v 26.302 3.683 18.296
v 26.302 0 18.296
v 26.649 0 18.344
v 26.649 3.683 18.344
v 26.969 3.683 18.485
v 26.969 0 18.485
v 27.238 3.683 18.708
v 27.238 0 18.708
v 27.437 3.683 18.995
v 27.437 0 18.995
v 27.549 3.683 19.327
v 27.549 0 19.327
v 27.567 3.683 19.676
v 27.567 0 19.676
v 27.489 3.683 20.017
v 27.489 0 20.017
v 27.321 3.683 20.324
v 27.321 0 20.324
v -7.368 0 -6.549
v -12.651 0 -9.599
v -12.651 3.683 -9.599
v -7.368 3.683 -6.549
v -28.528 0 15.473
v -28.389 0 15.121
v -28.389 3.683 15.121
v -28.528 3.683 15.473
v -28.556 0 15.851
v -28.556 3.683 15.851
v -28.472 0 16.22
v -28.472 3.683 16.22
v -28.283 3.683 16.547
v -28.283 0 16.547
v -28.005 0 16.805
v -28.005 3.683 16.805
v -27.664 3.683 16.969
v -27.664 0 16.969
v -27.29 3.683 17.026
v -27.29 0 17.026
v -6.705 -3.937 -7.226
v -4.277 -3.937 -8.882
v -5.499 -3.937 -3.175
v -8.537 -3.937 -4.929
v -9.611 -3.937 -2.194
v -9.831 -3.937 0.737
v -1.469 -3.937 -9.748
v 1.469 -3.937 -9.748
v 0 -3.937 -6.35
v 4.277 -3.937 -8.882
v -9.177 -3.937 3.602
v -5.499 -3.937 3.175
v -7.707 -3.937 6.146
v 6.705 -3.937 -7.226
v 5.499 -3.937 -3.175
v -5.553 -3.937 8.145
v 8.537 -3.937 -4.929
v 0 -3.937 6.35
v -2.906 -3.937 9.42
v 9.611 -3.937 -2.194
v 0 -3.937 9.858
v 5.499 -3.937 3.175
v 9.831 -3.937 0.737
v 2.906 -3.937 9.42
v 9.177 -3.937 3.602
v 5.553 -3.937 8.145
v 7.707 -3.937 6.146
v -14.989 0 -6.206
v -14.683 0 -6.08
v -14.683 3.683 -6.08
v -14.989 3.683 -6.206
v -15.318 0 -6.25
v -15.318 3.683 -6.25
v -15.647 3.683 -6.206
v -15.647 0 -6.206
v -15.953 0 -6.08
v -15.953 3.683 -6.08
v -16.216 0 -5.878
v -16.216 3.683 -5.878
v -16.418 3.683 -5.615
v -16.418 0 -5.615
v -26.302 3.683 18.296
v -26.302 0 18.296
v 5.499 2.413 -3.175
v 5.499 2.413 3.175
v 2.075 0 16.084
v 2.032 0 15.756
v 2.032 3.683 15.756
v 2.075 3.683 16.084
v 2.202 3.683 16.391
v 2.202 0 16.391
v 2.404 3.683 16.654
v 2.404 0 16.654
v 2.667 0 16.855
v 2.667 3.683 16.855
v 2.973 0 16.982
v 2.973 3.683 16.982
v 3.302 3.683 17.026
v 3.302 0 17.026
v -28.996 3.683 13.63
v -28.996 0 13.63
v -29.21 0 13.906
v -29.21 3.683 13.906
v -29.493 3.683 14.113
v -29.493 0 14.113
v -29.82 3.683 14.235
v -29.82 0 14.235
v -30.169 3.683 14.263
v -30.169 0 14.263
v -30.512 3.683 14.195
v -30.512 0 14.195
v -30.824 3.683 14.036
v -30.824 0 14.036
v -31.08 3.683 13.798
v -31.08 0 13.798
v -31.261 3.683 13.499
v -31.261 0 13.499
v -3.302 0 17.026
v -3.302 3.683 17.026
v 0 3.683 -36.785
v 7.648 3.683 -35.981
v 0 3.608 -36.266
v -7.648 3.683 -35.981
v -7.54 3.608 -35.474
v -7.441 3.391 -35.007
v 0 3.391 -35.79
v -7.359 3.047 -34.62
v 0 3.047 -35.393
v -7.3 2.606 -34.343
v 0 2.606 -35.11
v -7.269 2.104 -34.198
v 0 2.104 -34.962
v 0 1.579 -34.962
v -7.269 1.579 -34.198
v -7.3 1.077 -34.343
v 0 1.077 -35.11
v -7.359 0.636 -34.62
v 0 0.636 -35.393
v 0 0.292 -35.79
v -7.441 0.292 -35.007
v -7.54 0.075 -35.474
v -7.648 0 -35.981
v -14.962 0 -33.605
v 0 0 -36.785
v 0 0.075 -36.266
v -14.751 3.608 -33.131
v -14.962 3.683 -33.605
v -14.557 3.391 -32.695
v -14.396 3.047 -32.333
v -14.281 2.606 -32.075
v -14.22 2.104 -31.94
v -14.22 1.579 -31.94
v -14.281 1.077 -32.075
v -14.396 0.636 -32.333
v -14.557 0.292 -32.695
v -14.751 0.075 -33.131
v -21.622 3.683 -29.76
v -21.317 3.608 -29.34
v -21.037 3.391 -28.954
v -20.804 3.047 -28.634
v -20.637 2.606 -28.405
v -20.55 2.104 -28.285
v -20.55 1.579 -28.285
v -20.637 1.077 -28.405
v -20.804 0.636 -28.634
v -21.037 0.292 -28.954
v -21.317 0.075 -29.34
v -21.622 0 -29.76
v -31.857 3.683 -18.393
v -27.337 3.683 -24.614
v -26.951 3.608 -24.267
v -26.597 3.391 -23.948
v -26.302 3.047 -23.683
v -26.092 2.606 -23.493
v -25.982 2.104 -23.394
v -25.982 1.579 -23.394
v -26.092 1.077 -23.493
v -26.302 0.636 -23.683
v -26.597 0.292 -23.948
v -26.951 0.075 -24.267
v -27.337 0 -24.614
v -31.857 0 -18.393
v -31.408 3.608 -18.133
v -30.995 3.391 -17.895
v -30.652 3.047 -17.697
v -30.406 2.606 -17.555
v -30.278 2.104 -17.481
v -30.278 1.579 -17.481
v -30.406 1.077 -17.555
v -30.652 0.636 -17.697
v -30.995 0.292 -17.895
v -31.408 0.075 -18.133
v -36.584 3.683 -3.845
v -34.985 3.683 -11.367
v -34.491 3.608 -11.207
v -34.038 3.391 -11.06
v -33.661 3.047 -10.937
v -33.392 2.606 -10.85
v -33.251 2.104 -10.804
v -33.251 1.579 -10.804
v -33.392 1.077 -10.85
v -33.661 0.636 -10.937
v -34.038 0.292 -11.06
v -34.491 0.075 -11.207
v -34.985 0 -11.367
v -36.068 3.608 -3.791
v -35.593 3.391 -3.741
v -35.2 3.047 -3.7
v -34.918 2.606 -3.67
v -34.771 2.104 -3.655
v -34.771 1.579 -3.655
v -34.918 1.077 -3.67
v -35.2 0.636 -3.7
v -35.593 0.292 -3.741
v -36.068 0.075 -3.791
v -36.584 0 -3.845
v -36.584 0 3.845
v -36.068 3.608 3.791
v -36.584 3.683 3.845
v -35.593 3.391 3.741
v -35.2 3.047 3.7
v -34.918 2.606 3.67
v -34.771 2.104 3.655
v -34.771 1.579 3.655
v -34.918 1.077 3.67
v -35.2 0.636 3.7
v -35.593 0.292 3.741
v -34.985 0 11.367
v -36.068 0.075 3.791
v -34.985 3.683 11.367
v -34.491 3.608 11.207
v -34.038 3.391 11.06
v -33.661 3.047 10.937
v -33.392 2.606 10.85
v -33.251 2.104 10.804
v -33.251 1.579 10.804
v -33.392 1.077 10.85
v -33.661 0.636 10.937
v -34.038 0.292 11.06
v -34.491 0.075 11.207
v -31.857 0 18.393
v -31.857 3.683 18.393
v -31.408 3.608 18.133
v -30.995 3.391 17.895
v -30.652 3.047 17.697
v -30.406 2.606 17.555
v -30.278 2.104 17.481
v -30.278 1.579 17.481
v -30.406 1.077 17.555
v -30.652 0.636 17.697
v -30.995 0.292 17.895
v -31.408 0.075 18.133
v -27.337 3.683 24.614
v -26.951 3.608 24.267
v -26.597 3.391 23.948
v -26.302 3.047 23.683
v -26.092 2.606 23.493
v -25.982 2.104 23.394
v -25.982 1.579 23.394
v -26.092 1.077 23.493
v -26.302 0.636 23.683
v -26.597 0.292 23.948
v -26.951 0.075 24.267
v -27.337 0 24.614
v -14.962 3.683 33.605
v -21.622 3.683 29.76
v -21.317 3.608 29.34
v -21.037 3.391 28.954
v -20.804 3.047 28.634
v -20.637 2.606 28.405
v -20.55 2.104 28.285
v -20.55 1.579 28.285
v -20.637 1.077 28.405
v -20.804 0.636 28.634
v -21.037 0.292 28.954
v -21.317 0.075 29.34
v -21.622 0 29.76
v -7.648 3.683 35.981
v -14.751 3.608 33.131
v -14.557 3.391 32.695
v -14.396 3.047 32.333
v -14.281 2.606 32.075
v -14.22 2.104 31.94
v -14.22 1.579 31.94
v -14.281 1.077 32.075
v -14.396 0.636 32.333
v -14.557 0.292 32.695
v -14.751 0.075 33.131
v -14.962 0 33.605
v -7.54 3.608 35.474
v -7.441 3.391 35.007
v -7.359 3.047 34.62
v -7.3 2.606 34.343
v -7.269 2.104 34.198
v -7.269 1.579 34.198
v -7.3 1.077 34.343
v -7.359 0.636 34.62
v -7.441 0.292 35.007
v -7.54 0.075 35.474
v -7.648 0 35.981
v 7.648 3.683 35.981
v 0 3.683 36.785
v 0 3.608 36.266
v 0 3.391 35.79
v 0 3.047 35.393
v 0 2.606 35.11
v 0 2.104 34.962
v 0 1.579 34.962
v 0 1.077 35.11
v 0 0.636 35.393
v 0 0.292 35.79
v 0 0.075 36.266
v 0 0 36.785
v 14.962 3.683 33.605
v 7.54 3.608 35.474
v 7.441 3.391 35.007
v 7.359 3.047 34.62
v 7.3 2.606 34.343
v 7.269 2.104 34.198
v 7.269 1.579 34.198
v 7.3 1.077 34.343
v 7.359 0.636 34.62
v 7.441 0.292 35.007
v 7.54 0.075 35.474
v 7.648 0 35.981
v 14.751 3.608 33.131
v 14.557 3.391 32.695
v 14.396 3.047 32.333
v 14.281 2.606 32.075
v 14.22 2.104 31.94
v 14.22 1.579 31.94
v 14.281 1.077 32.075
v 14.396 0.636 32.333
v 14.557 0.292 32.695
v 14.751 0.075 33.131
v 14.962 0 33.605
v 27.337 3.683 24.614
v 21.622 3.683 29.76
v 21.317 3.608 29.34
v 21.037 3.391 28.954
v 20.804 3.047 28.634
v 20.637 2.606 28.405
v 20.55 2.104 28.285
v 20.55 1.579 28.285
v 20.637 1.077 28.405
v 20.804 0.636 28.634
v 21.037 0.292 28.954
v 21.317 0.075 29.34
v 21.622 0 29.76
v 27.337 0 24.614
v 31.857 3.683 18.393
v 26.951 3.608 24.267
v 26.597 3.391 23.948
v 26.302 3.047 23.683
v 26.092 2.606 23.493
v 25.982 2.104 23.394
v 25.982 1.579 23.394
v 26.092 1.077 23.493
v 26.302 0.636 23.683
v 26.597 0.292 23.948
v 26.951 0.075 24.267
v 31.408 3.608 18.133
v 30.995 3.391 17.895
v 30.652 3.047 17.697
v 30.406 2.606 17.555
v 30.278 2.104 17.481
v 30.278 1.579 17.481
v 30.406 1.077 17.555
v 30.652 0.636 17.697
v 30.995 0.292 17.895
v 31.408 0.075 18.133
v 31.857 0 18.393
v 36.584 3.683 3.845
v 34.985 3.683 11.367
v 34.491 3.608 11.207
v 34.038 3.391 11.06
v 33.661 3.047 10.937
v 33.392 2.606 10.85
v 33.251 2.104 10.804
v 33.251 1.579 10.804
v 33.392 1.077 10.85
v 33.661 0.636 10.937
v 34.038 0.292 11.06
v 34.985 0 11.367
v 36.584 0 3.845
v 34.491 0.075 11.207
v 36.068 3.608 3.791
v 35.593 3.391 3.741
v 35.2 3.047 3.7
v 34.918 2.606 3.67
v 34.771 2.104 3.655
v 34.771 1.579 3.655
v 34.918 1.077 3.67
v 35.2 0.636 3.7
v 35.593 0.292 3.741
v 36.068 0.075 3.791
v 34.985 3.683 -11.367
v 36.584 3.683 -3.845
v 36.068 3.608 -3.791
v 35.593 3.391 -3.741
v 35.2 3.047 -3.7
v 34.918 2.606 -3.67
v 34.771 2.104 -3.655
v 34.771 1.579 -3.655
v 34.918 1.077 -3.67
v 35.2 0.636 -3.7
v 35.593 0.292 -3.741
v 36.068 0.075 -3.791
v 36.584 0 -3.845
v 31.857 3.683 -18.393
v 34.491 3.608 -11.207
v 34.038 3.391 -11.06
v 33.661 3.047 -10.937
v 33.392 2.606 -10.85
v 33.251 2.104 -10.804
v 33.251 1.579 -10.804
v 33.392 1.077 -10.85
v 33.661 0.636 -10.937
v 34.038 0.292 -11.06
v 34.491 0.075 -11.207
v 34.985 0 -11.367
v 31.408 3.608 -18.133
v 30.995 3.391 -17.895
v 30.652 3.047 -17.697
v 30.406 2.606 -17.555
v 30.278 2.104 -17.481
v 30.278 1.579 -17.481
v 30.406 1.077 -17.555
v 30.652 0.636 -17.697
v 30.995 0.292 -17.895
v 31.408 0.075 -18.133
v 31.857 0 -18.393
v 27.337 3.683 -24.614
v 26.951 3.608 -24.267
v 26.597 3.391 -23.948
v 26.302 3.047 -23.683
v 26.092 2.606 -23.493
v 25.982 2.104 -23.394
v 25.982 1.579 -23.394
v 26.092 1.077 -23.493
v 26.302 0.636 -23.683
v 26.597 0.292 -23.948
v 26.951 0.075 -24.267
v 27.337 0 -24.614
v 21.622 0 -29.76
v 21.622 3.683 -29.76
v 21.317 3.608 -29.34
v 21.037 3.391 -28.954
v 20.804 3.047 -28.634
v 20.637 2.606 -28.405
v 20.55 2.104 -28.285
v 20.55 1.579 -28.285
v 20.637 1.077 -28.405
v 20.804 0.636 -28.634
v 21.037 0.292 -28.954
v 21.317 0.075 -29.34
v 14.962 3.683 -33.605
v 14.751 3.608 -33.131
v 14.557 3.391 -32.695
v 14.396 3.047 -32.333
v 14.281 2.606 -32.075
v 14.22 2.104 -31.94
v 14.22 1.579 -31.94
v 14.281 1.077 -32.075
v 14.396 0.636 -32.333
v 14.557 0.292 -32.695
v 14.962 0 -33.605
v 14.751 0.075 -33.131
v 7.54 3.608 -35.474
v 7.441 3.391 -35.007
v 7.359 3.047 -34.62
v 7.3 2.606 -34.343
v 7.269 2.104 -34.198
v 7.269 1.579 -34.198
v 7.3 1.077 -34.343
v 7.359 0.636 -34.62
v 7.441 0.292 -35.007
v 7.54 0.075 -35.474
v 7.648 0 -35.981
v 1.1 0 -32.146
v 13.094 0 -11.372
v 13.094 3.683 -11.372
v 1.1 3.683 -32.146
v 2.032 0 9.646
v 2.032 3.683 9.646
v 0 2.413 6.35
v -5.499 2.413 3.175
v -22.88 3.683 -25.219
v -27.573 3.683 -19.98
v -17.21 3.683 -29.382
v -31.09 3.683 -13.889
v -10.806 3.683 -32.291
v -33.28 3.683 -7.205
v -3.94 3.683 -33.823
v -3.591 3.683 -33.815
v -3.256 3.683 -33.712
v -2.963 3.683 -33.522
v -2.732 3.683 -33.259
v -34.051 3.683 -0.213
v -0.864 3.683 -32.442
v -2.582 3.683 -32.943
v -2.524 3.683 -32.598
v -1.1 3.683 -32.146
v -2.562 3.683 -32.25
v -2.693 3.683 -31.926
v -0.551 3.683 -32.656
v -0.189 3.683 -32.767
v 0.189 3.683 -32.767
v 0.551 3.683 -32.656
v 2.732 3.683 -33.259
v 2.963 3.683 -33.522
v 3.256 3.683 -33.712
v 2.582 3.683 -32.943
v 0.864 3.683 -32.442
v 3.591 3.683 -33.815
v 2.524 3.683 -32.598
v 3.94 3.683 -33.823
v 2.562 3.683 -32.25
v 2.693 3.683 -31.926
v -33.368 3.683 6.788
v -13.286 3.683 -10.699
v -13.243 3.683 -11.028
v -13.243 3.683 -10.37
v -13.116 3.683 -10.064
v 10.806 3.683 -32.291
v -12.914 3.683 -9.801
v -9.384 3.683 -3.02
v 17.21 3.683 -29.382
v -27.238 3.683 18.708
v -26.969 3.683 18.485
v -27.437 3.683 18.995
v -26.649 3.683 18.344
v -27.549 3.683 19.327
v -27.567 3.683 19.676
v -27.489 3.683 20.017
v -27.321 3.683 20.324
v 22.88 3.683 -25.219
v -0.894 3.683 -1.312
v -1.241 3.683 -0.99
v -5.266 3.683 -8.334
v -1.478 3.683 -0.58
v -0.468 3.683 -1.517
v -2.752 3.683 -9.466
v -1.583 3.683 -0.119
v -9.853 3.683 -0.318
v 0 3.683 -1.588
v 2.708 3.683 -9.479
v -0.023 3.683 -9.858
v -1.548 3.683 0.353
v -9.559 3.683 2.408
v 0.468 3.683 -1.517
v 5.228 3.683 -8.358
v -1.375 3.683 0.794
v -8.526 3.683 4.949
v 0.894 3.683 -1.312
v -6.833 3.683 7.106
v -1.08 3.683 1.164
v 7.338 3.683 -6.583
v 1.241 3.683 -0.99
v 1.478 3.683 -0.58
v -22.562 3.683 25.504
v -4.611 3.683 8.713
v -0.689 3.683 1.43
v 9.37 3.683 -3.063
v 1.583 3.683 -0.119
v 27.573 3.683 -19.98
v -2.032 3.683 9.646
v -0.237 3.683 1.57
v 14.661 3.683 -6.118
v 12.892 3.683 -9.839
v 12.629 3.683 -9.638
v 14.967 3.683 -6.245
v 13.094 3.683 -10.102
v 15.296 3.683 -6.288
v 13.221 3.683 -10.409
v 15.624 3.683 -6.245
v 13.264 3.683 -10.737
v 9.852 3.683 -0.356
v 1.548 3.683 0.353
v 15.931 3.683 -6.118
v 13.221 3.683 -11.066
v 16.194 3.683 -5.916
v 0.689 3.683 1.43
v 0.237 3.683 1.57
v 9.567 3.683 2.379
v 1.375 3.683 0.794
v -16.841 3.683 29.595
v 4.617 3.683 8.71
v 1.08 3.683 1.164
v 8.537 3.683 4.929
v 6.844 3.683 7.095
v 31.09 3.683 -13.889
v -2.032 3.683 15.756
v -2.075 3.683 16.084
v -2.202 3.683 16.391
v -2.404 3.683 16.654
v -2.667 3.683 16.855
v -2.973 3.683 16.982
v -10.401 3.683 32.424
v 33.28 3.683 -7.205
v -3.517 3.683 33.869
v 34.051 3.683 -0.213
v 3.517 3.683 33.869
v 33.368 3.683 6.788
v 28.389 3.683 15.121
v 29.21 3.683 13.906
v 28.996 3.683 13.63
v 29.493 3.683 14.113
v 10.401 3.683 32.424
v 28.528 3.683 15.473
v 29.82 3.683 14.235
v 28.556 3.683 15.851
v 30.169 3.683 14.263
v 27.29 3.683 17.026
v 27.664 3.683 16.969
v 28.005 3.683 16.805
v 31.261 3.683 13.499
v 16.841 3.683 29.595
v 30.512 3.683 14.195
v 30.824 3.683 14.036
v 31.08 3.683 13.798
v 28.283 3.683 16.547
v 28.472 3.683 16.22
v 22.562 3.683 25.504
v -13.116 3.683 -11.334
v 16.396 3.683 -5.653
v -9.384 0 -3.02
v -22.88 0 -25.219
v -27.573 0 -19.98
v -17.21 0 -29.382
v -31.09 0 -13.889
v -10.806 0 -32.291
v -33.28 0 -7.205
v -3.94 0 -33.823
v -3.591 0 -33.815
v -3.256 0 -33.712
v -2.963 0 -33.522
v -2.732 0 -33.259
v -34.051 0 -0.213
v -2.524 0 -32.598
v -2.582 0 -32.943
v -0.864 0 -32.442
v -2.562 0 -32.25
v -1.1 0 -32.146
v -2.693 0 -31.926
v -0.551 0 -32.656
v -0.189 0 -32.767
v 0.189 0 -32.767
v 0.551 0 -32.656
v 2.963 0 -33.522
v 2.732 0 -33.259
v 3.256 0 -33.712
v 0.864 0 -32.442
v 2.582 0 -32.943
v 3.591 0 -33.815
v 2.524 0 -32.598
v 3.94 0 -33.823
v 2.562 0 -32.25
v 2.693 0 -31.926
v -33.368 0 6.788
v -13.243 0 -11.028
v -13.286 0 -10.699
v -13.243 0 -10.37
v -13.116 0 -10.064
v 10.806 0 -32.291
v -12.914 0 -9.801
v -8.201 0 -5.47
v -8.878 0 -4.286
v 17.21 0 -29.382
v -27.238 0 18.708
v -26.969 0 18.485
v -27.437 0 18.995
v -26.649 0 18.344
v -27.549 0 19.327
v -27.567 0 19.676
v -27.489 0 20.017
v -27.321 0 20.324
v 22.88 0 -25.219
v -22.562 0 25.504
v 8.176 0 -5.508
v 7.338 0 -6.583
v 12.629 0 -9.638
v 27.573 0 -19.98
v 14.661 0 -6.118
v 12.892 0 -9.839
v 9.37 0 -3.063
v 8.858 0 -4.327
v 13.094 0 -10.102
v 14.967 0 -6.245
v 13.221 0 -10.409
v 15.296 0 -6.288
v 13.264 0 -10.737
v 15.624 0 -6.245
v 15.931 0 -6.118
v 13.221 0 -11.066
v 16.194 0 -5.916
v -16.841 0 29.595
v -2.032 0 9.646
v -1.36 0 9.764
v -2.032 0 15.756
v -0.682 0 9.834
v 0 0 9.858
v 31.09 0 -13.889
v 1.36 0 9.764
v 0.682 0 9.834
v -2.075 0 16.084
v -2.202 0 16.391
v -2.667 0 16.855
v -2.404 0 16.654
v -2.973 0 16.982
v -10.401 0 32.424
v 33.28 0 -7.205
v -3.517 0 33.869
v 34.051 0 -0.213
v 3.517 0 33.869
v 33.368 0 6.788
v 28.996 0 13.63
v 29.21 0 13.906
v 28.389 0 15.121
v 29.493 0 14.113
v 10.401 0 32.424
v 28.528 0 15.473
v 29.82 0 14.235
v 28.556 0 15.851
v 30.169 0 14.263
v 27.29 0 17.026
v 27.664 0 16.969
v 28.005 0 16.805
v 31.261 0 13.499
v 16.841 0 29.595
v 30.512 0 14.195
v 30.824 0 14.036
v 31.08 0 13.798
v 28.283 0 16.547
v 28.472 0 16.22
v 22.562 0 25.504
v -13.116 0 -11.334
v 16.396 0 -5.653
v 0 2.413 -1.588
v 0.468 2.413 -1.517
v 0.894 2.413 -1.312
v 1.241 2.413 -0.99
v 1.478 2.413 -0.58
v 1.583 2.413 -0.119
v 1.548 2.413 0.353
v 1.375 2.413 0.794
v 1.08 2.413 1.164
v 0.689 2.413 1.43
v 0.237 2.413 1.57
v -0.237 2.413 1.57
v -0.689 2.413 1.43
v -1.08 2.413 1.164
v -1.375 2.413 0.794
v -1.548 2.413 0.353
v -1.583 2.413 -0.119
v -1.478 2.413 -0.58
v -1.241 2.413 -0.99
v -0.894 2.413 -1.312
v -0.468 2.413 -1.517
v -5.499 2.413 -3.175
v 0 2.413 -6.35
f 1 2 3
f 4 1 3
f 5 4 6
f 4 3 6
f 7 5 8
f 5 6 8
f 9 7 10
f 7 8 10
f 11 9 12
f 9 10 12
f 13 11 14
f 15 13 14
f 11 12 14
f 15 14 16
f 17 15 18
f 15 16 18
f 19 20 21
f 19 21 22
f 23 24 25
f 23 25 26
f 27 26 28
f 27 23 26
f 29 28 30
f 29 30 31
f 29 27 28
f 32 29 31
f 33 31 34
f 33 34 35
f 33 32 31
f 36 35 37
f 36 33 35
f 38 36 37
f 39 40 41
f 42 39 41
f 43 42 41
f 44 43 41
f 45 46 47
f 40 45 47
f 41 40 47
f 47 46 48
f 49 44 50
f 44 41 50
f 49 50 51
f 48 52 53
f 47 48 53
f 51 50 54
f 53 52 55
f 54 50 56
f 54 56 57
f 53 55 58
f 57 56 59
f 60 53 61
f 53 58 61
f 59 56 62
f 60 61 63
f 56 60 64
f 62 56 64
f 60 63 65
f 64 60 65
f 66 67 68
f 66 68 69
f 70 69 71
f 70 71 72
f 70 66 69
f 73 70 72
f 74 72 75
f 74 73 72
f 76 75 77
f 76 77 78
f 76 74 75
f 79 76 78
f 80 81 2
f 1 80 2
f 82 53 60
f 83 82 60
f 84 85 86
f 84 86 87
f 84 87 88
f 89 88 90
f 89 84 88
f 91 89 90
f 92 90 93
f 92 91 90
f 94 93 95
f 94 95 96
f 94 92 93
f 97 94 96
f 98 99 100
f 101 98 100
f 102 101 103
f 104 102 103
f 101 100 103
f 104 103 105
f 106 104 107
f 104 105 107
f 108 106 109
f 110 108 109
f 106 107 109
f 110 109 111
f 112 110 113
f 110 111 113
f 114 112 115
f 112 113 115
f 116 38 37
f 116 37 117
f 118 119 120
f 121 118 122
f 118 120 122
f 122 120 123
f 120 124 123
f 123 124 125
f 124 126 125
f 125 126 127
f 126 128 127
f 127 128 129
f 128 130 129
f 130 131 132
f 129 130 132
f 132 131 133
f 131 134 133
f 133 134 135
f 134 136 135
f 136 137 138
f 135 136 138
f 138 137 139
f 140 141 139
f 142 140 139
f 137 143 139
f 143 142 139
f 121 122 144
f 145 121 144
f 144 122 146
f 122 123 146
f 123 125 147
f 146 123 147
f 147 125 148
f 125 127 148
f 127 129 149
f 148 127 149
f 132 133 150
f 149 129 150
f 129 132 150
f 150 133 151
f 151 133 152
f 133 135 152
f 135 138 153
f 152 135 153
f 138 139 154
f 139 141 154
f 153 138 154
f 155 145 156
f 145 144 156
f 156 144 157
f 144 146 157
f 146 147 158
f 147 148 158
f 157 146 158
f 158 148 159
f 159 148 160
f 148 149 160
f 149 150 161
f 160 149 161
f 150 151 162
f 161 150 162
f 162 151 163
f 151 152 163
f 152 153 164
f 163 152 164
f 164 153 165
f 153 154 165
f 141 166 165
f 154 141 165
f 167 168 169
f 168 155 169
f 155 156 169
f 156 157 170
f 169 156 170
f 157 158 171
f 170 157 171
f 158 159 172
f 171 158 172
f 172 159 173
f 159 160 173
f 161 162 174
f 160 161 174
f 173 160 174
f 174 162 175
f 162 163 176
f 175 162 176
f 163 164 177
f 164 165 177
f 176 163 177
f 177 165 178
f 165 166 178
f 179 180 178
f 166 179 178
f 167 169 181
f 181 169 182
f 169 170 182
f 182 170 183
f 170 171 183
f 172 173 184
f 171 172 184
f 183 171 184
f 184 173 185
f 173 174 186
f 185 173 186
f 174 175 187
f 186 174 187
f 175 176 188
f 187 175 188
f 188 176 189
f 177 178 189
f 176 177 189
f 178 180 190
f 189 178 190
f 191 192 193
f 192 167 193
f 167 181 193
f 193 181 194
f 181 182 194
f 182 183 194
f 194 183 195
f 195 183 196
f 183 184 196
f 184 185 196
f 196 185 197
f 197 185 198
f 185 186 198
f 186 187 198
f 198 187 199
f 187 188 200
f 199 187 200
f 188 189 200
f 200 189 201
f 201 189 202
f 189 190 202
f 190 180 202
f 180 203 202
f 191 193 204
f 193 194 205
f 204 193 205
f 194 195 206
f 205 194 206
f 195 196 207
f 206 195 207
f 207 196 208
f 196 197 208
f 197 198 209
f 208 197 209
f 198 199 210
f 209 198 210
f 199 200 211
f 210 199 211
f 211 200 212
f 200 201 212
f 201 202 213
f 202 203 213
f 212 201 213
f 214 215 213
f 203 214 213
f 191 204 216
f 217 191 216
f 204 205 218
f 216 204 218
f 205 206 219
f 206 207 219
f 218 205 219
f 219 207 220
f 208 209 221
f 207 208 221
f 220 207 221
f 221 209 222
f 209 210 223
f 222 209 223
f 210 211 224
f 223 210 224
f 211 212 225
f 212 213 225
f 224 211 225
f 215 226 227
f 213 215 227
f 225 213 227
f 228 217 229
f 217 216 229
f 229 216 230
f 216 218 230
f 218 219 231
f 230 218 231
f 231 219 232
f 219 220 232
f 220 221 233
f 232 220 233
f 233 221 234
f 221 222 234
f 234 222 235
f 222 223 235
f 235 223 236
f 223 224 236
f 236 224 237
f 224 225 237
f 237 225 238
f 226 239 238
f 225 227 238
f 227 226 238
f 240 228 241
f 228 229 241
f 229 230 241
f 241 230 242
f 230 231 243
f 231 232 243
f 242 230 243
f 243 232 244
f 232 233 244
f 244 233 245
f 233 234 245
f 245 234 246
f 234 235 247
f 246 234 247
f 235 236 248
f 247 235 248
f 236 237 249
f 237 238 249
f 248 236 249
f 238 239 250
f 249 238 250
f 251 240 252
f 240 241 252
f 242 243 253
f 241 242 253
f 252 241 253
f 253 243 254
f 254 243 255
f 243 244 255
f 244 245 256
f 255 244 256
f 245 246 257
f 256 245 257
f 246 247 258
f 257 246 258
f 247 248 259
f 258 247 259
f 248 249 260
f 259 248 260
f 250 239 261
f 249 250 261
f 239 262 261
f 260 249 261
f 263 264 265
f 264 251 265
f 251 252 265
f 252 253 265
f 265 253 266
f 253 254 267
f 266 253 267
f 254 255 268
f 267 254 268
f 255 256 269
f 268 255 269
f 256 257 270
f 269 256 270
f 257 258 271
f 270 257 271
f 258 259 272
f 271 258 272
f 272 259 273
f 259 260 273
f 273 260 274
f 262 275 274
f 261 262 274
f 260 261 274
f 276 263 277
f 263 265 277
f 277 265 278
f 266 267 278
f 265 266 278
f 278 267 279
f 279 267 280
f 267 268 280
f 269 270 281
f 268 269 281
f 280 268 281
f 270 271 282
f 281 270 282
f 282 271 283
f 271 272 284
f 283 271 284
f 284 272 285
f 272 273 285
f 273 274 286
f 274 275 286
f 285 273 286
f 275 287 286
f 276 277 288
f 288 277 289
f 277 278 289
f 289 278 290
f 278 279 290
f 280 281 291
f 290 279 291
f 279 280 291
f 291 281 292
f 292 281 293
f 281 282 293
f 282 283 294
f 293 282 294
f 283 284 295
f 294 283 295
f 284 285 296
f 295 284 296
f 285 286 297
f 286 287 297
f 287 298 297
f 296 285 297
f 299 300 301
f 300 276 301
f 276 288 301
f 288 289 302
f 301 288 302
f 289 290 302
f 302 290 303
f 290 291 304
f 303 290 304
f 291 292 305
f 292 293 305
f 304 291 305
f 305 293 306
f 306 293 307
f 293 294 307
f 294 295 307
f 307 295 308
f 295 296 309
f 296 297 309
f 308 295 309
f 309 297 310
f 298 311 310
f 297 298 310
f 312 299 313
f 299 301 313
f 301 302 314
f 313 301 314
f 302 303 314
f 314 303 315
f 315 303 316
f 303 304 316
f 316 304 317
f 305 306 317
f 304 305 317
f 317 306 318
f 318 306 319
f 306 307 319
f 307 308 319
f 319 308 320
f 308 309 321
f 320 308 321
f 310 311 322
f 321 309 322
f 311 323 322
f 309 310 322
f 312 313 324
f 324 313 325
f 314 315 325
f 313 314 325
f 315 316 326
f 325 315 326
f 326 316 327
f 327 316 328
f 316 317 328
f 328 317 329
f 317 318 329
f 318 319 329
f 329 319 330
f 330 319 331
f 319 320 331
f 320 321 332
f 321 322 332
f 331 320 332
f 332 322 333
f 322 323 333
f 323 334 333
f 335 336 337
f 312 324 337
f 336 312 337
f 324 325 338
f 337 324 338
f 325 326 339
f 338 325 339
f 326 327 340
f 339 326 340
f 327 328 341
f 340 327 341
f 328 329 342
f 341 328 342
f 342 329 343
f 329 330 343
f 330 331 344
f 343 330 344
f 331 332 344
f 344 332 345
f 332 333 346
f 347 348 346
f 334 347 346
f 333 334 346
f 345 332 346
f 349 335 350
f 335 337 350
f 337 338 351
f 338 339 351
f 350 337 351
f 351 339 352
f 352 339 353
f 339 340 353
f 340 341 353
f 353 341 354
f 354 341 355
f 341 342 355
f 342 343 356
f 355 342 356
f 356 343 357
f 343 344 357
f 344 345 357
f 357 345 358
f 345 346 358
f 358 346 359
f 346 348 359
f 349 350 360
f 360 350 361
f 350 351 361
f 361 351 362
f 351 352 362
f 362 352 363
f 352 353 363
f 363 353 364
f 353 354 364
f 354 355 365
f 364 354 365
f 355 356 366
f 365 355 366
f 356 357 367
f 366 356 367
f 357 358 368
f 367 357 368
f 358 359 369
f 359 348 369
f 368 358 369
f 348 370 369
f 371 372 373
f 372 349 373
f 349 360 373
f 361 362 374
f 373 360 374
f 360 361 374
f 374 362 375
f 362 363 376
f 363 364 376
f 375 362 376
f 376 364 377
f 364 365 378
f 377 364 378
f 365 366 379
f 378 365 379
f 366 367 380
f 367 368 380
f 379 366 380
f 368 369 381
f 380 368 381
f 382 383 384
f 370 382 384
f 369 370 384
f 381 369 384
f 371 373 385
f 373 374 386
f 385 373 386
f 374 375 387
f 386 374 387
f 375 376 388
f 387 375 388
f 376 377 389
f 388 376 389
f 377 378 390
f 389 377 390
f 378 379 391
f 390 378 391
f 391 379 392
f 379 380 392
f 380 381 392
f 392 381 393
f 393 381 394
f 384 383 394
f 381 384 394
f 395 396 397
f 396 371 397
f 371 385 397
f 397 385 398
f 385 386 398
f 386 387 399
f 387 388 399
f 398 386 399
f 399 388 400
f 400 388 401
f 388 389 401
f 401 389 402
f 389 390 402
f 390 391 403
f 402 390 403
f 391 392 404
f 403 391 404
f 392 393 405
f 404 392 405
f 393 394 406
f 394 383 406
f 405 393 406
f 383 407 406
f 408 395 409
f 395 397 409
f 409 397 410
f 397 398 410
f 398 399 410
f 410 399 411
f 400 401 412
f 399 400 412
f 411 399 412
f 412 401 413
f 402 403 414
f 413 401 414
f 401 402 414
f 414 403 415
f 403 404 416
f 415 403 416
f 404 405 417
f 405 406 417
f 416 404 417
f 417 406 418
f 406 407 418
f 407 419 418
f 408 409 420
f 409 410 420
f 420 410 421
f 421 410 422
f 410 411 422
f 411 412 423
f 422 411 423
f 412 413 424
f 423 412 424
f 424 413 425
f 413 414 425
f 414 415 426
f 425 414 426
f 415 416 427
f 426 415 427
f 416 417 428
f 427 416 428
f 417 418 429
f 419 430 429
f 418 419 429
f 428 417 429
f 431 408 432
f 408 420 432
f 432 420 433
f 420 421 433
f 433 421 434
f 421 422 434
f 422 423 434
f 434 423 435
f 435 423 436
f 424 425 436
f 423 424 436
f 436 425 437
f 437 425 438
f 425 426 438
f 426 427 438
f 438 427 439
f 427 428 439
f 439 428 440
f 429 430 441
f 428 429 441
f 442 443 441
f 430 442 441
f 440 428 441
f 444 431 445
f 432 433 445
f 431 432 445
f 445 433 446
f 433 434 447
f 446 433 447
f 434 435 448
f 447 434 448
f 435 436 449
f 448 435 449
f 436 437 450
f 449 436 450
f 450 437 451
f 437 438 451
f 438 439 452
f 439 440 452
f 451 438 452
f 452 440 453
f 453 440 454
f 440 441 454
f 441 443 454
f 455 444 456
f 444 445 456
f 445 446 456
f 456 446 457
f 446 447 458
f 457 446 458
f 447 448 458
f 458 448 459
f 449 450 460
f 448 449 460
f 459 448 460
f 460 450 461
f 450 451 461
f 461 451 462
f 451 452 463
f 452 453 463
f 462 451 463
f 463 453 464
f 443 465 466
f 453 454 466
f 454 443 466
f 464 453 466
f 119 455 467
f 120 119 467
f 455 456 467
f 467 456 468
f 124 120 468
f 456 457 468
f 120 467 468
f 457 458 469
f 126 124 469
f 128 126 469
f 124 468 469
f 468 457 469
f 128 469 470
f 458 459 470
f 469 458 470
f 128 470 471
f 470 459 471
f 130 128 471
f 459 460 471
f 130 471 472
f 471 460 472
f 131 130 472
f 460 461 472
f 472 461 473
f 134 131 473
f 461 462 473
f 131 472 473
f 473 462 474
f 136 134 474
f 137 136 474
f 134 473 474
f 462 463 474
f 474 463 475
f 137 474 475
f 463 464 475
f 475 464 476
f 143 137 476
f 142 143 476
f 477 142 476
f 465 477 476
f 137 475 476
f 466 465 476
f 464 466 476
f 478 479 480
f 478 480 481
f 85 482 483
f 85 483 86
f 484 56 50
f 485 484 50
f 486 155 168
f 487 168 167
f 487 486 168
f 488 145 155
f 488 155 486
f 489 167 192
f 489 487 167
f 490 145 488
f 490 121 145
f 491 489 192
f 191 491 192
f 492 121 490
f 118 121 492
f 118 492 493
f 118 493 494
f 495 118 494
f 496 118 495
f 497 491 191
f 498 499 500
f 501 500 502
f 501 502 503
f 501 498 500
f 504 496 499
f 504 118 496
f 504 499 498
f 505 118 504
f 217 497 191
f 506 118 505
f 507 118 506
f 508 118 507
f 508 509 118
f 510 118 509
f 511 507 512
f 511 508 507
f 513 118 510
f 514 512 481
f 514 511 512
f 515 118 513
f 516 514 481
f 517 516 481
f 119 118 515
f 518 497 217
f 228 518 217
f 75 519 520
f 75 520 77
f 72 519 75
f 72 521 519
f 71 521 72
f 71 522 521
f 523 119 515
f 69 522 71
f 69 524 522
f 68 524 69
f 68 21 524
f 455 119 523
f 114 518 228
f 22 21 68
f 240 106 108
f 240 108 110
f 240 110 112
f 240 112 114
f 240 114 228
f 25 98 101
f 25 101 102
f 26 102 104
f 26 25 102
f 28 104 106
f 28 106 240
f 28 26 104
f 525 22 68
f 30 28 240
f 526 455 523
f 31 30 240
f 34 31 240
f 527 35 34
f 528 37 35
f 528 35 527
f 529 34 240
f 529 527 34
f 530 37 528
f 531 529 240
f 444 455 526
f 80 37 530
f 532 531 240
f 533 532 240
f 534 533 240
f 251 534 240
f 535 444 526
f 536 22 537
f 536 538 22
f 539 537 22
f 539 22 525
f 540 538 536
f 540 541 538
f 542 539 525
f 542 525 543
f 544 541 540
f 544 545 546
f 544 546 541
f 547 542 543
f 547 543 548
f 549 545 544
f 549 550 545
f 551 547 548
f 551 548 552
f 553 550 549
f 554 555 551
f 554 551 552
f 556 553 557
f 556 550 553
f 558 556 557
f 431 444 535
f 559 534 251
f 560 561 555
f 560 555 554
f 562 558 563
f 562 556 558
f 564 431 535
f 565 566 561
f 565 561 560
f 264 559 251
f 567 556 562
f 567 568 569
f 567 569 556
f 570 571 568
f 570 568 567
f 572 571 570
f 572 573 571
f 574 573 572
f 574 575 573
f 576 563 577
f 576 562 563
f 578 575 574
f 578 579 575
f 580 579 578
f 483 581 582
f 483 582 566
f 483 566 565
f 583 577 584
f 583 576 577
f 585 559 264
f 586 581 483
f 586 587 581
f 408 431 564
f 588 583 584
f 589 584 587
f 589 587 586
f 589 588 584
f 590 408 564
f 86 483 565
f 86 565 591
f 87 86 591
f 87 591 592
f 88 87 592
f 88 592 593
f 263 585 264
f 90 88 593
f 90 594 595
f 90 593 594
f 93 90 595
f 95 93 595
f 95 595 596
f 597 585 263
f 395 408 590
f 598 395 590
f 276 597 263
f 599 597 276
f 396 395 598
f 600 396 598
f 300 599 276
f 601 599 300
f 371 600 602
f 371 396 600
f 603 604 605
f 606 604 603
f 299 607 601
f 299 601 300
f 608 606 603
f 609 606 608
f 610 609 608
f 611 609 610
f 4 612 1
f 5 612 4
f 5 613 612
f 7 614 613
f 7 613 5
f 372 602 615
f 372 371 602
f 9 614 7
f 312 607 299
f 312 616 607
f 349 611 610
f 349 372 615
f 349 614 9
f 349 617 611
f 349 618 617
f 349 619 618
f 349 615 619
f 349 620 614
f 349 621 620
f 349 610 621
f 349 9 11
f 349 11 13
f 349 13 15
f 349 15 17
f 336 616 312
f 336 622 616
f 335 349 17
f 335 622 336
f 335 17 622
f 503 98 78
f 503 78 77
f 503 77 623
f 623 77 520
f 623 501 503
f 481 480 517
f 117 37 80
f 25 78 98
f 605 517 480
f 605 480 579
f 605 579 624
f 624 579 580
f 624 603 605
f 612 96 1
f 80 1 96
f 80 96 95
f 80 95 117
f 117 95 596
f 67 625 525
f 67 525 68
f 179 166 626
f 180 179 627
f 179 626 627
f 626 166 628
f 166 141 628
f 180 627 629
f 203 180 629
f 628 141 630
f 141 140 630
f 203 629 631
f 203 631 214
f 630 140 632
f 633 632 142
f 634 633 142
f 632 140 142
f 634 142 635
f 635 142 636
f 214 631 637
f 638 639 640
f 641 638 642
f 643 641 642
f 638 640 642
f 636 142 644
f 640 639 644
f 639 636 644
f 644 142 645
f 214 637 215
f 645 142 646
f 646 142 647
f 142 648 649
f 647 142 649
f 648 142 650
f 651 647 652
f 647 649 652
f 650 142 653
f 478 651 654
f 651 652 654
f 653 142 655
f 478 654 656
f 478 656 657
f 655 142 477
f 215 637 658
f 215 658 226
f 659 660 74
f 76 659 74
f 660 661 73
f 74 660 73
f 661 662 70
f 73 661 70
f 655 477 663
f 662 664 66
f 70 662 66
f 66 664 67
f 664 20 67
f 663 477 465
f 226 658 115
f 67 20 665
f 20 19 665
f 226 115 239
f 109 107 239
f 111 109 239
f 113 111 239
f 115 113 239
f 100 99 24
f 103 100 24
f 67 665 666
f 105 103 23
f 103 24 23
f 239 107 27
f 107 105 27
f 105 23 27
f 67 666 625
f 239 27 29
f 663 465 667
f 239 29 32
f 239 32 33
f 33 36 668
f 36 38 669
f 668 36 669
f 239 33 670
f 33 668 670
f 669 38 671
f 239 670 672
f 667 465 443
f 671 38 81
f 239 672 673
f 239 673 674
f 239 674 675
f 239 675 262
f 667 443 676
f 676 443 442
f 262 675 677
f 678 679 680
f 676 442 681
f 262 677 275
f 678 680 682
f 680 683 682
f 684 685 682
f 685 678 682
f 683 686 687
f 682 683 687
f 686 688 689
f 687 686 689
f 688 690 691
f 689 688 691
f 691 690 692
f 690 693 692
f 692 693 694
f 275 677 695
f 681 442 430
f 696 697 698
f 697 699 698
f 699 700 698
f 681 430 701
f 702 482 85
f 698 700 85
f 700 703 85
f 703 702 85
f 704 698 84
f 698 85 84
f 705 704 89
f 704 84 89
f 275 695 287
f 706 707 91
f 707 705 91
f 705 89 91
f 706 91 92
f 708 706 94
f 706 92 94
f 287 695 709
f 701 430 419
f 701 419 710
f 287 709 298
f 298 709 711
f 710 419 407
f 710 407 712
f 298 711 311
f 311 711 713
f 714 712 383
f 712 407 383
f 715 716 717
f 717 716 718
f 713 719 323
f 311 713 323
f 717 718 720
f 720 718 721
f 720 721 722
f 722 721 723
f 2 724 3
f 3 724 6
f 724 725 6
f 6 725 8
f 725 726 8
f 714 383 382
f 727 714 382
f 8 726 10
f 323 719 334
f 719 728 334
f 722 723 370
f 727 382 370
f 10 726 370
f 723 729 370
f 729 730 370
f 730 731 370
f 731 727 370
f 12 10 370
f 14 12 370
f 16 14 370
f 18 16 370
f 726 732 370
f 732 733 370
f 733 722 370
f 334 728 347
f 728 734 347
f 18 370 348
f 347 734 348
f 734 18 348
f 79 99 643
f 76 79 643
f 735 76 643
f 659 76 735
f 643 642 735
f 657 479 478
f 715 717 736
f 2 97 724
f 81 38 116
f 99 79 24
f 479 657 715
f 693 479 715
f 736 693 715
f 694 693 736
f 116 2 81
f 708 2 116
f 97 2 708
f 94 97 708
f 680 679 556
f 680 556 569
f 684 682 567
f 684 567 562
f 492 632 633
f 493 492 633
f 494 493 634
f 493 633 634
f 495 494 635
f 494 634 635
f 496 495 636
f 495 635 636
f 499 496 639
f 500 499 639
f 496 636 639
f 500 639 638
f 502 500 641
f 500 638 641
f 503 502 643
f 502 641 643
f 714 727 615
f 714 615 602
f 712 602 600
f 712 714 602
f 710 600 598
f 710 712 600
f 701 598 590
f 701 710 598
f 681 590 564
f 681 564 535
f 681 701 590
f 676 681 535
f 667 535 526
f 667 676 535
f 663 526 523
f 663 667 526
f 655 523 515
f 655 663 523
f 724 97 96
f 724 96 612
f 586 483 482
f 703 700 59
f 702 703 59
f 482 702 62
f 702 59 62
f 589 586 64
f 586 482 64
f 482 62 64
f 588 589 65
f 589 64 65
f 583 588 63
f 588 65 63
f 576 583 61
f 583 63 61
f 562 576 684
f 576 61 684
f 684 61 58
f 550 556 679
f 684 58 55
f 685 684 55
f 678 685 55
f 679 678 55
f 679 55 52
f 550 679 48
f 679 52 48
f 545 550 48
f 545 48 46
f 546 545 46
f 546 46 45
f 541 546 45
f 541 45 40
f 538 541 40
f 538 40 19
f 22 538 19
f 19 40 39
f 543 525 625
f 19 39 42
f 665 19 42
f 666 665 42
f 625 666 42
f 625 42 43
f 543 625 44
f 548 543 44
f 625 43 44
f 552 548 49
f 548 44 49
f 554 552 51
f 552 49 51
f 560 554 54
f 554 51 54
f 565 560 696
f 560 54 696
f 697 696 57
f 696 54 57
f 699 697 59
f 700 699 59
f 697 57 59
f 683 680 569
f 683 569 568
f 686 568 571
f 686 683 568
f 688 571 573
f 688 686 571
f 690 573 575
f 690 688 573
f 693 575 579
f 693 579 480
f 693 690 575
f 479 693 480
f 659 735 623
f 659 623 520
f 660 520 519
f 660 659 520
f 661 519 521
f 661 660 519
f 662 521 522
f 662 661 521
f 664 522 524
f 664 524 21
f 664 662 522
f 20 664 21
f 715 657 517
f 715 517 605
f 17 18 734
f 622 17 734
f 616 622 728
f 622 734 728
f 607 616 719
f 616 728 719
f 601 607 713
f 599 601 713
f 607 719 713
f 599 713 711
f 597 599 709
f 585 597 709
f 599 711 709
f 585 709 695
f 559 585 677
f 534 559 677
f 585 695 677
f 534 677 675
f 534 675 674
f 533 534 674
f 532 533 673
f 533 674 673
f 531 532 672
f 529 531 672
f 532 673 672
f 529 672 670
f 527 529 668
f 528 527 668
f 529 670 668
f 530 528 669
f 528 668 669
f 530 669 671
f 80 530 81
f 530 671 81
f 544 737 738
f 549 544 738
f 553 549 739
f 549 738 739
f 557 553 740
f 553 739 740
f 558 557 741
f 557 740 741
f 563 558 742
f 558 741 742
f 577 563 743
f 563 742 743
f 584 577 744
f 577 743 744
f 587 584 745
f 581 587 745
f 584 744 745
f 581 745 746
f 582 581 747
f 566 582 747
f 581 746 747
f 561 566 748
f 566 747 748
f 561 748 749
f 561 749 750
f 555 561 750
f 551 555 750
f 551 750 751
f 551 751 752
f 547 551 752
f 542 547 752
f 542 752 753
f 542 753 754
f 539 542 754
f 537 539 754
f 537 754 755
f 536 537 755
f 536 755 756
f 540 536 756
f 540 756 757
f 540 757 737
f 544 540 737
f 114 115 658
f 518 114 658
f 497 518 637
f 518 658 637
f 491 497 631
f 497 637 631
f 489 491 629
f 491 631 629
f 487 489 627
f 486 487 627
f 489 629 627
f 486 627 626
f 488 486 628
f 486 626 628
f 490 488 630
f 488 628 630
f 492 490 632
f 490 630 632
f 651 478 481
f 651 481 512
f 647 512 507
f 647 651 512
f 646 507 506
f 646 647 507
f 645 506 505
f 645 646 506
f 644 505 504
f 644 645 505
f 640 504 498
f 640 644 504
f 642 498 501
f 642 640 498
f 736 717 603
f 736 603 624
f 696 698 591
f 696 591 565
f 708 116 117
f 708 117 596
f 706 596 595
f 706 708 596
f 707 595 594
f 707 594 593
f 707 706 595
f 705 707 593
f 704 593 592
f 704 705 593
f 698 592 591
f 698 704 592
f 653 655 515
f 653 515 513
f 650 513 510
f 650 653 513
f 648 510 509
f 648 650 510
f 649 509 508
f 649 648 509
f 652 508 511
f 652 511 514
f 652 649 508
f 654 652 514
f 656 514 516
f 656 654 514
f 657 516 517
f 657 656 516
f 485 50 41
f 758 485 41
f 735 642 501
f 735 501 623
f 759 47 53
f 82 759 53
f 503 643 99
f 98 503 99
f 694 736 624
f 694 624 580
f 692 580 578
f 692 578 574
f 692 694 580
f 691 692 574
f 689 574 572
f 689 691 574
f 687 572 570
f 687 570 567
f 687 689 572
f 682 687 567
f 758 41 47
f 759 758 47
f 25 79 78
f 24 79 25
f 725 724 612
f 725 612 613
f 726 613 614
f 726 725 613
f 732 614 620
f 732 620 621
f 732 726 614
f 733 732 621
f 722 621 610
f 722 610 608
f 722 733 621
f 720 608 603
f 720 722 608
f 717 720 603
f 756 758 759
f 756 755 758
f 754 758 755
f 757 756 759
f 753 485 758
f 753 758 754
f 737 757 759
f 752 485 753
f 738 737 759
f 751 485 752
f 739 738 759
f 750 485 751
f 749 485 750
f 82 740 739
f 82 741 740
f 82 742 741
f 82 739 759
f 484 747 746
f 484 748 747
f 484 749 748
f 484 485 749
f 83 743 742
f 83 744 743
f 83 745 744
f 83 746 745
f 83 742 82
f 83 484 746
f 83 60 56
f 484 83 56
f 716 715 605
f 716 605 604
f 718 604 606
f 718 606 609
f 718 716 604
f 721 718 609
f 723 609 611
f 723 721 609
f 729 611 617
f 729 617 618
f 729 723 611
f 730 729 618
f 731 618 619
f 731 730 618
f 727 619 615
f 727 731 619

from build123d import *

# Parameters (mm, degrees)
SKETCH1_R           = 36.785134715
BOSS_EXTRUDE1_DEPTH = 3.683
SKETCH2_R           = 1.8415
BOSS_EXTRUDE2_START = -7.62
SKETCH5_R           = 9.858095427
BOSS_EXTRUDE2_DEPTH = 7.62
SKETCH6_R           = 1.5875
CUT_EXTRUDE1_DEPTH  = 53.577149714
CUT_EXTRUDE3_DEPTH  = 6.35


with BuildPart() as part:
    # Sketch1 → Boss-Extrude1 (new body)
    with BuildSketch(Plane(origin=(0, 0, 0), x_dir=(1, 0, 0), z_dir=(0, 1, 0))):
        Circle(SKETCH1_R)
        with BuildLine():
            Line((-1.099852263, 32.146289174), (-13.115875302, 11.333926765))
            ThreePointArc((-13.115875302, 11.333926765), (-13.242748838, 10.370226578), (-12.651023039, 9.599074503))
            Line((-12.651023039, 9.599074503), (-7.368281269, 6.549082119))
            ThreePointArc((-7.368281269, 6.549082119), (-8.559992893, 4.889638753), (-9.384056343, 3.020187413))
            Line((-9.384056343, 3.020187413), (-14.683023039, 6.079547262))
            ThreePointArc((-14.683023039, 6.079547262), (-15.646723226, 6.206420798), (-16.417875302, 5.614694999))
            Line((-16.417875302, 5.614694999), (-28.389429193, -15.120644587))
            ThreePointArc((-28.389429193, -15.120644587), (-28.389429193, -16.390644587), (-27.289576931, -17.025644587))
            Line((-27.289576931, -17.025644587), (-3.302, -17.025644587))
            ThreePointArc((-3.302, -17.025644587), (-2.403974388, -16.653670199), (-2.032, -15.755644587))
            Line((-2.032, -15.755644587), (-2.032, -9.646399404))
            ThreePointArc((-2.032, -9.646399404), (0, -9.858095427), (2.032, -9.646399404))
            Line((2.032, -9.646399404), (2.032, -15.755644587))
            ThreePointArc((2.032, -15.755644587), (2.403974388, -16.653670199), (3.302, -17.025644587))
            Line((3.302, -17.025644587), (27.289576931, -17.025644587))
            ThreePointArc((27.289576931, -17.025644587), (28.389429193, -16.390644587), (28.389429193, -15.120644587))
            Line((28.389429193, -15.120644587), (16.395640728, 5.65320641))
            ThreePointArc((16.395640728, 5.65320641), (15.624488653, 6.24493221), (14.660788465, 6.118058673))
            Line((14.660788465, 6.118058673), (9.370026939, 3.063436081))
            ThreePointArc((9.370026939, 3.063436081), (8.537361073, 4.929047714), (7.338026939, 6.582963322))
            Line((7.338026939, 6.582963322), (12.628788465, 9.637585914))
            ThreePointArc((12.628788465, 9.637585914), (13.220514265, 10.408737989), (13.093640728, 11.372438177))
            Line((13.093640728, 11.372438177), (1.099852263, 32.146289174))
            ThreePointArc((1.099852263, 32.146289174), (0, 32.781289174), (-1.099852263, 32.146289174))
        make_face(mode=Mode.SUBTRACT)
        with BuildLine():
            Line((-2.693461931, 31.926076262), (-28.995524051, -13.630431675))
            ThreePointArc((-28.995524051, -13.630431675), (-30.168979582, -14.26329703), (-31.261319719, -13.498895652))
            ThreePointArc((-31.261319719, -13.498895652), (-29.489281456, 17.025644587), (-3.940273302, 33.822544859))
            ThreePointArc((-3.940273302, 33.822544859), (-2.732112221, 33.258751239), (-2.693461931, 31.926076262))
        make_face(mode=Mode.SUBTRACT)
        with BuildLine():
            Line((2.693461931, 31.926076262), (28.995524051, -13.630431675))
            ThreePointArc((28.995524051, -13.630431675), (30.168979582, -14.26329703), (31.261319719, -13.498895652))
            ThreePointArc((31.261319719, -13.498895652), (29.489281456, 17.025644587), (3.940273302, 33.822544859))
            ThreePointArc((3.940273302, 33.822544859), (2.732112221, 33.258751239), (2.693461931, 31.926076262))
        make_face(mode=Mode.SUBTRACT)
        with BuildLine():
            Line((-26.302062121, -18.295644587), (26.302062121, -18.295644587))
            ThreePointArc((26.302062121, -18.295644587), (27.436867361, -18.995454209), (27.321046417, -20.323649206))
            ThreePointArc((27.321046417, -20.323649206), (0, -34.051289174), (-27.321046417, -20.323649206))
            ThreePointArc((-27.321046417, -20.323649206), (-27.436867361, -18.995454209), (-26.302062121, -18.295644587))
        make_face(mode=Mode.SUBTRACT)
    extrude(amount=BOSS_EXTRUDE1_DEPTH)

    # Sketch2 → Cut-Revolve2 (revolve, cut)
    with BuildSketch(Plane.XY):
        with Locations((36.785134715, 1.8415)):
            Circle(SKETCH2_R)
    revolve(axis=Axis((0, 0, 0), (0, 1, 0)), mode=Mode.SUBTRACT)

    # Sketch5 → Boss-Extrude2 (add)
    with BuildSketch(Plane(origin=(0, 3.683, 0), x_dir=(1, 0, 0), z_dir=(0, 1, 0)).offset(BOSS_EXTRUDE2_START)):
        Circle(SKETCH5_R)
    extrude(amount=BOSS_EXTRUDE2_DEPTH)

    # Sketch6 → Cut-Extrude1 (cut, through all)
    with BuildSketch(Plane.XZ.offset(3.937)):
        Circle(SKETCH6_R)
    extrude(amount=-CUT_EXTRUDE1_DEPTH, mode=Mode.SUBTRACT)

    # Sketch8 → Cut-Extrude3 (cut)
    with BuildSketch(Plane.XZ.offset(3.937)):
        Polygon((0, 6.35), (-5.499261314, 3.175), (-5.499261314, -3.175), (0, -6.35), (5.499261314, -3.175), (5.499261314, 3.175), align=None)
    extrude(amount=-CUT_EXTRUDE3_DEPTH, mode=Mode.SUBTRACT)


solid = part.part
